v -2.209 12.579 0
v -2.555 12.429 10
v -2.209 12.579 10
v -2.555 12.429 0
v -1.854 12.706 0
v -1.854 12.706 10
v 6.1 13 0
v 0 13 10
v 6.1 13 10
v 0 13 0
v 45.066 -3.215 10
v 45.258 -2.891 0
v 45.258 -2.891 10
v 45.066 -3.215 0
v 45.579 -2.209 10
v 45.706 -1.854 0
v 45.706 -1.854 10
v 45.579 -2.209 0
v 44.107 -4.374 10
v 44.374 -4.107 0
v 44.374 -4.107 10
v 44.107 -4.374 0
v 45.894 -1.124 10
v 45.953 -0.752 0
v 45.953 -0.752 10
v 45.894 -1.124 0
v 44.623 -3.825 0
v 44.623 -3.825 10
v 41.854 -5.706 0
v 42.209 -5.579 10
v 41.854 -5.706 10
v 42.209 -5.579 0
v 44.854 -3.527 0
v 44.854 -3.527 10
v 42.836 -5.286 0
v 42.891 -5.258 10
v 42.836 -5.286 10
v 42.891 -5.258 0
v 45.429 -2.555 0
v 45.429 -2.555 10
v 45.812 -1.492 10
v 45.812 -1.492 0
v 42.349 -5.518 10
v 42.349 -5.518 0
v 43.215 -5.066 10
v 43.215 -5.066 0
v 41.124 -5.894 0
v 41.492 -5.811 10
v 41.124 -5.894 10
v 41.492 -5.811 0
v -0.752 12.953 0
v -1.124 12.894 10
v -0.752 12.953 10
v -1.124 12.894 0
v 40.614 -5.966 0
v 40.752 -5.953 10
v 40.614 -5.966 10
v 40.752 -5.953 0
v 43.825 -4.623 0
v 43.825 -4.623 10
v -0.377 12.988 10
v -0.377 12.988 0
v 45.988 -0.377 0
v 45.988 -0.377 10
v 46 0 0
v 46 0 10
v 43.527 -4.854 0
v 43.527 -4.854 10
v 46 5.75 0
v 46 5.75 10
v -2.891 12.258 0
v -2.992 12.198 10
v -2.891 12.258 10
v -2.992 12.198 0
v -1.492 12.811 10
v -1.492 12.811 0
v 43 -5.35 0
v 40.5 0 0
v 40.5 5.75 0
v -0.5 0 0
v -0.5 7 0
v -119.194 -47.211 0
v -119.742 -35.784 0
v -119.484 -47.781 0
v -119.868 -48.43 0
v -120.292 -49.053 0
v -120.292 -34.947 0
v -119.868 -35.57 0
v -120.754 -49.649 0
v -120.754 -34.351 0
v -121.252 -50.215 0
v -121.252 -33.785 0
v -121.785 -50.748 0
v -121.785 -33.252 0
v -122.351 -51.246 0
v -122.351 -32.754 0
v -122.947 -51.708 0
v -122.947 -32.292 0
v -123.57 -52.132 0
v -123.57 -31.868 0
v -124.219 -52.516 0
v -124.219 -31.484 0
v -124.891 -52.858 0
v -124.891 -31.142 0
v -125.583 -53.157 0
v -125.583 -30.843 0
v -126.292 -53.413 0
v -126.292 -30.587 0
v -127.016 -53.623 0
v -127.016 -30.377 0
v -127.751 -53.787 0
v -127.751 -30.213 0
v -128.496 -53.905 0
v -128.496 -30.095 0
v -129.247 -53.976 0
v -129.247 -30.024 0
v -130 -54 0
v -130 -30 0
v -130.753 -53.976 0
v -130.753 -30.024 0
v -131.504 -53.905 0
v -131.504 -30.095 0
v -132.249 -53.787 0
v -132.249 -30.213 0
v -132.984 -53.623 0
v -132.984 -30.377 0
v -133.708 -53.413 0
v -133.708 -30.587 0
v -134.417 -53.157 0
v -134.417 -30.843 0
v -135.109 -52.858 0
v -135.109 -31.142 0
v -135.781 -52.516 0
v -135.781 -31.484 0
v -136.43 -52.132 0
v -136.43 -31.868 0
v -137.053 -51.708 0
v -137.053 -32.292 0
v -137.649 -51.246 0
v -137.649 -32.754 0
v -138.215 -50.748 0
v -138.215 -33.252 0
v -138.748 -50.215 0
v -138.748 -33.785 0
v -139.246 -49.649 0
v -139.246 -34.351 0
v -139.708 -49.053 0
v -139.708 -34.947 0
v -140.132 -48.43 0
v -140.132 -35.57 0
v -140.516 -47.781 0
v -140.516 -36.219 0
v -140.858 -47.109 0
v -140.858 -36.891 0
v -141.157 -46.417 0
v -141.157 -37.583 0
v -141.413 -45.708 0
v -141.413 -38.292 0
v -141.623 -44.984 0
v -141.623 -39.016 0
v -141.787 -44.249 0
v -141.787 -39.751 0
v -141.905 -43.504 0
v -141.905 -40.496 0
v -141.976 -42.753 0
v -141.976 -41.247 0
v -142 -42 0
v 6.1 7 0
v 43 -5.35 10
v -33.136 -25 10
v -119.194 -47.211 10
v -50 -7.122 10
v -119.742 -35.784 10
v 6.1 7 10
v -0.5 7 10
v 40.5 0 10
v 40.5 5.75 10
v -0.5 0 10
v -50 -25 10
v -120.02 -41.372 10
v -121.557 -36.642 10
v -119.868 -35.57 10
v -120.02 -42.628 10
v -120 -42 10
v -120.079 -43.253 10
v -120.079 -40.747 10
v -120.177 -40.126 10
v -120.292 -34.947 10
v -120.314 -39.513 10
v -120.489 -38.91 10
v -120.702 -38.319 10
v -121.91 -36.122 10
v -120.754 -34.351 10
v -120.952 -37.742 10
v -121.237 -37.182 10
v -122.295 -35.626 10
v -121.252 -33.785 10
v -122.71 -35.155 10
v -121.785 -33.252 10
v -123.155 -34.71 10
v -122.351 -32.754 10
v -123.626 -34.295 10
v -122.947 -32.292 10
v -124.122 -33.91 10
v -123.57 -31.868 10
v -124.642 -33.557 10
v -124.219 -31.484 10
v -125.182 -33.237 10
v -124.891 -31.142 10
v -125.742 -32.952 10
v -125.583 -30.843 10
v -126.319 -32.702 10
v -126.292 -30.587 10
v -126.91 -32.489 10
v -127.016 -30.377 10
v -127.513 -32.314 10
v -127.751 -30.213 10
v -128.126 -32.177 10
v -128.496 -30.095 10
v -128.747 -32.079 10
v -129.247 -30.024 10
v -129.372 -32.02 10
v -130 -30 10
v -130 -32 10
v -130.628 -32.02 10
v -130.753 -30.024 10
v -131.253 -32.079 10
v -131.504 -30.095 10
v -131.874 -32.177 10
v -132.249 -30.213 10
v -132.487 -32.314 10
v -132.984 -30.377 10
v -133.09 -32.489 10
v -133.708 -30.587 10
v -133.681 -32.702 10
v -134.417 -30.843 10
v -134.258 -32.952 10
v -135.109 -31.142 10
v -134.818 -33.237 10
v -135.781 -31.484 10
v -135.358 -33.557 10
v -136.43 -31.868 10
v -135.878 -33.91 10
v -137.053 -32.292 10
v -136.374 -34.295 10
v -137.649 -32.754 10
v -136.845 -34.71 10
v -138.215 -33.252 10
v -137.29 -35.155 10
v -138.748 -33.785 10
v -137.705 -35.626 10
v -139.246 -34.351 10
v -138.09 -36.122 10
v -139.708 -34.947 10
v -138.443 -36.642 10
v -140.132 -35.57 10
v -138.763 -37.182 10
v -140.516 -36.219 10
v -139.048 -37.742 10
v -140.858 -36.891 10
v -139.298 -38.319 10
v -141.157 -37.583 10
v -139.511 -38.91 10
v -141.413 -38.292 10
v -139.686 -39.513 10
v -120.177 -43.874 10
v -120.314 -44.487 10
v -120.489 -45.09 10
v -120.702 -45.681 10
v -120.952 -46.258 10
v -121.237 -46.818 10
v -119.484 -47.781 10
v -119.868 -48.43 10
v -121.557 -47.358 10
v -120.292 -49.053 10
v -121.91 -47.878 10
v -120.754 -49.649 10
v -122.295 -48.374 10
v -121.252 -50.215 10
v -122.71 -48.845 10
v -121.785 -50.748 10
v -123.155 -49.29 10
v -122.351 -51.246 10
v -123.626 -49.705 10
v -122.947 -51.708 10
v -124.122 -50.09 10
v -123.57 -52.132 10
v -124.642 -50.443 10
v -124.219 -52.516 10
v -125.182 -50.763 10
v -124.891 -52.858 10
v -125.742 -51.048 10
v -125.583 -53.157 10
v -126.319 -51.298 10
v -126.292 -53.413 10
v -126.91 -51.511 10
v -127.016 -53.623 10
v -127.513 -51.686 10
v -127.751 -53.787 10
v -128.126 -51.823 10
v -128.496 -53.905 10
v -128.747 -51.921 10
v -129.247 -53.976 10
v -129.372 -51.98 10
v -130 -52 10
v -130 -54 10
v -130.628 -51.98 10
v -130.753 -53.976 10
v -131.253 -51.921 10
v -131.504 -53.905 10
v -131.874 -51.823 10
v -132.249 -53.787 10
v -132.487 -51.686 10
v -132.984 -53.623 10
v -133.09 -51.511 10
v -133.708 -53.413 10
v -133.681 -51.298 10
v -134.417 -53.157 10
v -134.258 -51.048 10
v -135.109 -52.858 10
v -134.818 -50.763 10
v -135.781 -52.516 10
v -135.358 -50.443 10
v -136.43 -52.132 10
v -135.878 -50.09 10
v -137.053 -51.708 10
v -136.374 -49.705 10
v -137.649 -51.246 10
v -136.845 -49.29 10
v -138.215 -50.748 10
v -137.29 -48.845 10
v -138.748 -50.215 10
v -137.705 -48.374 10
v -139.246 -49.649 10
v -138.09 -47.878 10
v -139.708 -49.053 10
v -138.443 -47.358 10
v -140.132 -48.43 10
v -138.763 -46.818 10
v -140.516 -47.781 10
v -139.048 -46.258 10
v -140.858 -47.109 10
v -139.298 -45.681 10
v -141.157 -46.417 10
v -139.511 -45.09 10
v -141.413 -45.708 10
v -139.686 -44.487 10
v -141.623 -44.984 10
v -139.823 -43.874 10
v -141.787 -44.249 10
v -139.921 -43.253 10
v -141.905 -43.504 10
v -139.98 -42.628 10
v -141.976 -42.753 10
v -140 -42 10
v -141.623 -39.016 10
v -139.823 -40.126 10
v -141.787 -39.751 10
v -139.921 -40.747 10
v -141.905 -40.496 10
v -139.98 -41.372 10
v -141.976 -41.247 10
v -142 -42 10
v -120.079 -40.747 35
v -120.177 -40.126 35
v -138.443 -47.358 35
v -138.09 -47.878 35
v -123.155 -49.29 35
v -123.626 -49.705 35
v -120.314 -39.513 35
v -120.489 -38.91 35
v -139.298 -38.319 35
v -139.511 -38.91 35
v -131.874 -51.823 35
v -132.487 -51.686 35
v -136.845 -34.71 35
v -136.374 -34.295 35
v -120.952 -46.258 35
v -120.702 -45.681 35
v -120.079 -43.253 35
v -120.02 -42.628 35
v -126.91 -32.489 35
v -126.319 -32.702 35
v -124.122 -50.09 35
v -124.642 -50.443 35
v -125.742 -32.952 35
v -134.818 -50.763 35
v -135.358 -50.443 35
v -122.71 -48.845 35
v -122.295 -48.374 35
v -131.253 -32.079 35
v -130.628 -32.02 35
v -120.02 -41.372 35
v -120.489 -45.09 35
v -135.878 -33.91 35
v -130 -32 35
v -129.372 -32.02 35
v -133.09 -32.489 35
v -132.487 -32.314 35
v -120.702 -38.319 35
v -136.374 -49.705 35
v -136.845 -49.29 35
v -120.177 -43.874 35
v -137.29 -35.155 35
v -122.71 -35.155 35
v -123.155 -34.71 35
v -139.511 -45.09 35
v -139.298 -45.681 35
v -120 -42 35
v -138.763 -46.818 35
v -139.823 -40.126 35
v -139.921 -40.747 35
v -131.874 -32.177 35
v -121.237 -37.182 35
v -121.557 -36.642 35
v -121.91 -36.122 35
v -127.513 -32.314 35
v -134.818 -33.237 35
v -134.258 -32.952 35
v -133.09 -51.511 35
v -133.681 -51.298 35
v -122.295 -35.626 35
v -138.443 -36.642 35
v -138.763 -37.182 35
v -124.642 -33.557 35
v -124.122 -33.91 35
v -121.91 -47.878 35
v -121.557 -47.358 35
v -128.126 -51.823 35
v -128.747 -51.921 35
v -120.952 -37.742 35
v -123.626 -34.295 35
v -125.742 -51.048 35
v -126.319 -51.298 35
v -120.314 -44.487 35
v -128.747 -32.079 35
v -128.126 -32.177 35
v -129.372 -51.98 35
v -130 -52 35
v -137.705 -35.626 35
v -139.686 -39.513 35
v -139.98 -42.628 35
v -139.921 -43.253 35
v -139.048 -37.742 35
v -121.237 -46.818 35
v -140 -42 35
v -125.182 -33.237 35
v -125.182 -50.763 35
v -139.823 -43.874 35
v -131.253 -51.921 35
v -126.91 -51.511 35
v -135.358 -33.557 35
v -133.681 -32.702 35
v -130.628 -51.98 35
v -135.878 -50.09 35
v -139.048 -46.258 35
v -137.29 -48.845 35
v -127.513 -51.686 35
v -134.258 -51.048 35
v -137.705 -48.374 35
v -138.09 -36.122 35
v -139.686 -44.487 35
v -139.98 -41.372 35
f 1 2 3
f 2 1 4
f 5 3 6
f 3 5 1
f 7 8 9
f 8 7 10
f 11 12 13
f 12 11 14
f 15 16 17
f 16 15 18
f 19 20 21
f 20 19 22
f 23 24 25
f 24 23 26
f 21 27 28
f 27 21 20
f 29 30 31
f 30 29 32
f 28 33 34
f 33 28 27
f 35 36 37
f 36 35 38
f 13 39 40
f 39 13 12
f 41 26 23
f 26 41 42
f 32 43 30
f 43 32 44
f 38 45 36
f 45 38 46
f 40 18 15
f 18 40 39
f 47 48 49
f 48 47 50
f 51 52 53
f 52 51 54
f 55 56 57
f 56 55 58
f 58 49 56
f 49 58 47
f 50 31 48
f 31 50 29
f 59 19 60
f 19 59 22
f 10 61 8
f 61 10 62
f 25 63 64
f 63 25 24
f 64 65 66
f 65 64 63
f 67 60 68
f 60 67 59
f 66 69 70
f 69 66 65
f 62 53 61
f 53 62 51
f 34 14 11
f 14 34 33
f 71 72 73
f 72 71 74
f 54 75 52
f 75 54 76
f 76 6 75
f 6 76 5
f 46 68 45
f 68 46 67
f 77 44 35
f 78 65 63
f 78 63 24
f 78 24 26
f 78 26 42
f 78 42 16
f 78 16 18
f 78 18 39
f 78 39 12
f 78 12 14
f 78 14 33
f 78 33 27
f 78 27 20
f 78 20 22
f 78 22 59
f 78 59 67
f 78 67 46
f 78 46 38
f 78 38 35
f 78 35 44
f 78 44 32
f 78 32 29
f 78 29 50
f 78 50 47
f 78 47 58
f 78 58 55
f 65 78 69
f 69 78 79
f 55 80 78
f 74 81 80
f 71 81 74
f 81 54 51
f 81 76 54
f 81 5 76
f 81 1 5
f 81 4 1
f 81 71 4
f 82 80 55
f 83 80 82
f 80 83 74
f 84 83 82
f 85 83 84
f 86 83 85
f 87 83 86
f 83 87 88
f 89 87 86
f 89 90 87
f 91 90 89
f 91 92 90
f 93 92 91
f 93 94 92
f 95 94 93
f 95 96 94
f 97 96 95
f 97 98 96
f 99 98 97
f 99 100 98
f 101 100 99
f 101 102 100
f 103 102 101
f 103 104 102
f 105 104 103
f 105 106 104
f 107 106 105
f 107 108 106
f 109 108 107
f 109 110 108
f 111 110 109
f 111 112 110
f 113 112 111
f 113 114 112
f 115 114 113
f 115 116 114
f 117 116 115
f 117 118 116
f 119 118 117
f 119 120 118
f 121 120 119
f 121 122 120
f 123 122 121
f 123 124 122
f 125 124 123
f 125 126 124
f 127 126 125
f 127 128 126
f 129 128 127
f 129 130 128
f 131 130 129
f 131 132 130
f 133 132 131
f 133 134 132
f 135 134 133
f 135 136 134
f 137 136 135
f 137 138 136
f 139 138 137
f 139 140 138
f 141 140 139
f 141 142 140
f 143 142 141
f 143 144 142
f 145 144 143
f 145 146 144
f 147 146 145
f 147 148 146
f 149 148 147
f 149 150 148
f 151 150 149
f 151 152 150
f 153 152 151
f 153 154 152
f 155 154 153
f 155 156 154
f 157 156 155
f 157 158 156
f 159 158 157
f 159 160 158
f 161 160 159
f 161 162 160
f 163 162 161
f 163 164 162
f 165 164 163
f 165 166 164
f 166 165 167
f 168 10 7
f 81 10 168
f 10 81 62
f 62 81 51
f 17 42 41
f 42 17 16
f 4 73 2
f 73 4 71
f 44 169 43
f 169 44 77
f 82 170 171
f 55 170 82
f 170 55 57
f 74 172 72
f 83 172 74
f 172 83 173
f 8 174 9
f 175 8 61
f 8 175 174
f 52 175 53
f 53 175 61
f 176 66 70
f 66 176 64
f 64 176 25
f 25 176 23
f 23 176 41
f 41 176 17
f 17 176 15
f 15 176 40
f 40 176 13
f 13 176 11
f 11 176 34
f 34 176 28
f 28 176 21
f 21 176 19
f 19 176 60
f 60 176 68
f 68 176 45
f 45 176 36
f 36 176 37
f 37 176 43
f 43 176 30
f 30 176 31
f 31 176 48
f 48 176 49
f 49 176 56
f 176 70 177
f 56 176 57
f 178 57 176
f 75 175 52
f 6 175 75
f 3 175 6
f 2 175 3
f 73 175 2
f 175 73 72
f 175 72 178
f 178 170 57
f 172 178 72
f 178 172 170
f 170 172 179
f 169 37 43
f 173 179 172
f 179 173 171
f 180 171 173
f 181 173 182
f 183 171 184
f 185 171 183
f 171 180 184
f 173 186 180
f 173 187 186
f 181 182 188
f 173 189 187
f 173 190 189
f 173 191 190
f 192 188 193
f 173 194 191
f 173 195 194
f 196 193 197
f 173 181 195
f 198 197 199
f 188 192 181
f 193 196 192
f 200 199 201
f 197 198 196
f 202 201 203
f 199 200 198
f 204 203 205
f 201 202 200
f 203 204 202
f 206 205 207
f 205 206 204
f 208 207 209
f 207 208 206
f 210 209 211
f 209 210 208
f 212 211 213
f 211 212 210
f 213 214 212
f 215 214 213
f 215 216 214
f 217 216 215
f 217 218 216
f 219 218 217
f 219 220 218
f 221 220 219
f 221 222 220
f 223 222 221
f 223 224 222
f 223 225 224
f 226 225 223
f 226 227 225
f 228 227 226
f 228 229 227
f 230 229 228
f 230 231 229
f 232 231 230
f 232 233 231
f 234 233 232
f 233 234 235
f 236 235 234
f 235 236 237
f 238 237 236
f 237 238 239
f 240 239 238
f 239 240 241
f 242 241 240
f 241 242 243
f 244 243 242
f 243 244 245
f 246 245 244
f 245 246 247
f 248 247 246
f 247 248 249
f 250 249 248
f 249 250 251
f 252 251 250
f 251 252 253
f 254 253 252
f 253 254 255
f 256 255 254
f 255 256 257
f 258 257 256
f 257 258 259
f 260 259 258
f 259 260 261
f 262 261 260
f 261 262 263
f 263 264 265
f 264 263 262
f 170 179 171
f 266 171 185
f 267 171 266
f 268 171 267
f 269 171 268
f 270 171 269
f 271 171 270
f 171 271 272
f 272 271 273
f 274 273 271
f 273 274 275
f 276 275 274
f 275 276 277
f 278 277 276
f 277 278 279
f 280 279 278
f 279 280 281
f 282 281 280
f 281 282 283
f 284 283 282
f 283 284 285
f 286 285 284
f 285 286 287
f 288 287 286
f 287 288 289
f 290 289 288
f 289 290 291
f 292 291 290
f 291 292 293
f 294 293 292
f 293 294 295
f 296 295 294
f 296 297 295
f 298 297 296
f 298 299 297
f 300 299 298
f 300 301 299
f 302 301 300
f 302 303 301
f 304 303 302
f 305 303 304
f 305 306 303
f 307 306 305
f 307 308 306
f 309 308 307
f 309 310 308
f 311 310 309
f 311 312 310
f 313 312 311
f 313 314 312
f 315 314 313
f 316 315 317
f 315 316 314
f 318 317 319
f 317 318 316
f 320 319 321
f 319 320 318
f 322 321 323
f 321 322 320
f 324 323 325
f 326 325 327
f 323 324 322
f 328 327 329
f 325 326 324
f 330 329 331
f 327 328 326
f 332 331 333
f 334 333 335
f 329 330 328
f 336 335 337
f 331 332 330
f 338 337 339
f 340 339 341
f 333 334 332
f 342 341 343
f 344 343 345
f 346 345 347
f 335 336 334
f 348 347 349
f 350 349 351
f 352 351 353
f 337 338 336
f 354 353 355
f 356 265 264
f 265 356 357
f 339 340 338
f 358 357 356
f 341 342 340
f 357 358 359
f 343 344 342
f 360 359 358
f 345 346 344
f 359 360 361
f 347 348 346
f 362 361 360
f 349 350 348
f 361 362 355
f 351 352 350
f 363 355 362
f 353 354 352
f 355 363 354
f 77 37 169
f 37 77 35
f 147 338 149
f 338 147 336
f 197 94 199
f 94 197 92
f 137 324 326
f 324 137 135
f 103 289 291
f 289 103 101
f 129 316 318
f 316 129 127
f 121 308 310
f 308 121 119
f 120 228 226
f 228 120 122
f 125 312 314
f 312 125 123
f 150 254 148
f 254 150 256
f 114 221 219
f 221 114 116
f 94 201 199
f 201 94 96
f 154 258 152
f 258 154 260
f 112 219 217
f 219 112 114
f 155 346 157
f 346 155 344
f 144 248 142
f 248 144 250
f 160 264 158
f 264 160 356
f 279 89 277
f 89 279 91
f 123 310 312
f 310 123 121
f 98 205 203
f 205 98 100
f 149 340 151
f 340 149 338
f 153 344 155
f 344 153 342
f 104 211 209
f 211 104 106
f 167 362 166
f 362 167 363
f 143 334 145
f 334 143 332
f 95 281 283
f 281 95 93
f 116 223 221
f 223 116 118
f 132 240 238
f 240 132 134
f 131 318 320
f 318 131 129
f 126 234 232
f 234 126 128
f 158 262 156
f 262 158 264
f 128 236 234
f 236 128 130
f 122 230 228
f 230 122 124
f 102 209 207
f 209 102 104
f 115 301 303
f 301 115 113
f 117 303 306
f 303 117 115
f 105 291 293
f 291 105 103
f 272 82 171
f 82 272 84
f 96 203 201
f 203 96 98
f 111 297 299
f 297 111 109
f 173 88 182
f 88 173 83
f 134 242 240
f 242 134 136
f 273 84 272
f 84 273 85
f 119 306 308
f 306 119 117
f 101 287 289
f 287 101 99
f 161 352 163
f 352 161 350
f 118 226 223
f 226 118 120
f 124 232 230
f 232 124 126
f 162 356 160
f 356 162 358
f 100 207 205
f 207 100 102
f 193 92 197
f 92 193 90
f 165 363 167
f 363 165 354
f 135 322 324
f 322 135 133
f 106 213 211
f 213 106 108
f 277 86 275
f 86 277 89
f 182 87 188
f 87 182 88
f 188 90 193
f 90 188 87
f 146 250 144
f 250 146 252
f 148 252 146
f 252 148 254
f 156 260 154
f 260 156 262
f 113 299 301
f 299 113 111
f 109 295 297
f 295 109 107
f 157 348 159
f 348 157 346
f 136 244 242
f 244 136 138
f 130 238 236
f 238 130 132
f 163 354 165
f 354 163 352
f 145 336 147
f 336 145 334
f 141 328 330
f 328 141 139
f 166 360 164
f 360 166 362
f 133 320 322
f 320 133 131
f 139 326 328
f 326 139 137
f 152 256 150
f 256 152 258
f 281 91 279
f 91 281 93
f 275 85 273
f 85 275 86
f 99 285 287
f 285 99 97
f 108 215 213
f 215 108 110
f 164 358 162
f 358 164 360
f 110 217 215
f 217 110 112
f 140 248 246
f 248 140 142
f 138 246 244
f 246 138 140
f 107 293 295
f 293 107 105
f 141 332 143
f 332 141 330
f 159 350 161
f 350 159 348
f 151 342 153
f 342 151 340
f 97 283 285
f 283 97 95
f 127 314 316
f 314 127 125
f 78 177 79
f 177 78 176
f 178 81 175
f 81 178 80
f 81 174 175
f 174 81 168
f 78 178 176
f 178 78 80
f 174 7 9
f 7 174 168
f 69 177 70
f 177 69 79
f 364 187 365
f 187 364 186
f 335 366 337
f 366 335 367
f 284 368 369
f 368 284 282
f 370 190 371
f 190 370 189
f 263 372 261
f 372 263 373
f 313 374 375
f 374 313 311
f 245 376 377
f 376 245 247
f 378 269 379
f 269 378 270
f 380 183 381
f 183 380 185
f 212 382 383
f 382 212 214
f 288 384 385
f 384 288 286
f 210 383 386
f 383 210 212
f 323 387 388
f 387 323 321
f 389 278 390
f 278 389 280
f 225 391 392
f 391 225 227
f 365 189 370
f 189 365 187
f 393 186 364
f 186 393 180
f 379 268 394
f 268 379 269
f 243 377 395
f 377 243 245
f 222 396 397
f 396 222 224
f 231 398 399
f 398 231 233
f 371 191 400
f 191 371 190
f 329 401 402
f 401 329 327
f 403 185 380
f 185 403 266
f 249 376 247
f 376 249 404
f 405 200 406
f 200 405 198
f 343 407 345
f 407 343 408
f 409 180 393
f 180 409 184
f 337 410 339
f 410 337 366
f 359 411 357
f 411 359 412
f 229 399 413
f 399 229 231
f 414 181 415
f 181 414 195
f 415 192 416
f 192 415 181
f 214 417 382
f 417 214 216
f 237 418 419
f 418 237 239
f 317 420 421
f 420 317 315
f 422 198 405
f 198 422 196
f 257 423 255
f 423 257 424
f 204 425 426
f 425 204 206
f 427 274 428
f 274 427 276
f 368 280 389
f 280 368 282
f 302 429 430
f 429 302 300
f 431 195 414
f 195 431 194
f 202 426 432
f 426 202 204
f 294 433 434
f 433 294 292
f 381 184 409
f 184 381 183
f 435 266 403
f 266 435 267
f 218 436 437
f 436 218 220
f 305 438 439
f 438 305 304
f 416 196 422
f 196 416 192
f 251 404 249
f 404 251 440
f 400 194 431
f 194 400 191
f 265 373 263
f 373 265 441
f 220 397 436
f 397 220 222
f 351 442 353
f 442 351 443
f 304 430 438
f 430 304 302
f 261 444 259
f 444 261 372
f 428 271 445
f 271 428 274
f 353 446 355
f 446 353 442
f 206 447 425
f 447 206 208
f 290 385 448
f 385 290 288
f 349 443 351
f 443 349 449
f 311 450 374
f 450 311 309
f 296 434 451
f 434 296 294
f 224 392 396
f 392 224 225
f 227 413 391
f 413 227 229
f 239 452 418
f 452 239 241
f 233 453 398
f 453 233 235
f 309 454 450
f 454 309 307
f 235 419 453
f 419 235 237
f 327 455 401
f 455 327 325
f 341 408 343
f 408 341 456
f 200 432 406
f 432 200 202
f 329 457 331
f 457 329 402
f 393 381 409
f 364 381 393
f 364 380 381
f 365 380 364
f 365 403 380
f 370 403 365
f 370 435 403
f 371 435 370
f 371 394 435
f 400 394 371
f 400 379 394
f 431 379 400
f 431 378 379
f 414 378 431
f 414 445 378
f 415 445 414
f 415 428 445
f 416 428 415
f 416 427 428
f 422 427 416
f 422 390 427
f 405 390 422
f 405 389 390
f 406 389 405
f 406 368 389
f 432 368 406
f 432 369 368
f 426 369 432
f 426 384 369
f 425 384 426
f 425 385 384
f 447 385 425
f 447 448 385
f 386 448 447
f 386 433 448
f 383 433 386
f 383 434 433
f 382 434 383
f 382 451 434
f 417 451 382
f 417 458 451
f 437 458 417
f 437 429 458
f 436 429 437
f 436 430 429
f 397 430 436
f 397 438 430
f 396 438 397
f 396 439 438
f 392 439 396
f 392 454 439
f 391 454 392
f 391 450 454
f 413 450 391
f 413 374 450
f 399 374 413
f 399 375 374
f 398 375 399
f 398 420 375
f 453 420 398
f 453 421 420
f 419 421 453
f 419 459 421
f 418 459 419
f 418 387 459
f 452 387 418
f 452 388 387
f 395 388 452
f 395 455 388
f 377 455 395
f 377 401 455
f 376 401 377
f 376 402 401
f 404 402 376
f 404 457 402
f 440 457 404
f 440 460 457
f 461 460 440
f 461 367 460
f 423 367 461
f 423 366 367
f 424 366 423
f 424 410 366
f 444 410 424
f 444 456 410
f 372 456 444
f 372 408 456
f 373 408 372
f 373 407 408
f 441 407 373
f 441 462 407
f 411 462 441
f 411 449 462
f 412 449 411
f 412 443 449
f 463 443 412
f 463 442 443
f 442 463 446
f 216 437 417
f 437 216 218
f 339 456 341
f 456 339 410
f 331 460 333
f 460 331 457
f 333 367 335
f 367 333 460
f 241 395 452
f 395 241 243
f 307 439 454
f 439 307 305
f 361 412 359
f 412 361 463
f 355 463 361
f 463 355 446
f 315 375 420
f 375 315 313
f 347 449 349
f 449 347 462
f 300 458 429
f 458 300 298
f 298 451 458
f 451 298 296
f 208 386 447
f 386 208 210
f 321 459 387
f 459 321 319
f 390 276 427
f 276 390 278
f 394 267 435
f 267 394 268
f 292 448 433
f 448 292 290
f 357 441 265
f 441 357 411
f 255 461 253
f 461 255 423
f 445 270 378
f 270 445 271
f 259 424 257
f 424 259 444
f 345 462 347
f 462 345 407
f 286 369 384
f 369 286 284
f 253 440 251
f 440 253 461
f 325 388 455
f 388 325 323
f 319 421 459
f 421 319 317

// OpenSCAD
//--------------------------------------------------------------------------
//-- Soporte para rollo de filamento de prusa i3. (c) Antonio Castro Gómez
//--------------------------------------------------------------------------
//-- Released under the GPL license
//--------------------------------------------------------------------------


difference()
{
	union()
	{

		//enganche con marco
		difference()
		{
			union()
			{
				minkowski()
				{
					cylinder(h=8, r=6, $fn=100, center=true);
					translate([20,3.5,8])cube(size=[40,7,8], center=true);
				}

				//Cuerpo spooler
				linear_extrude(height = 10)
				polygon(points=[	[-2.5,12.4], /*pico enganche superior*/
								[43,-5.35], /*pico encganche inferior*/
								[-130,-50],
								[-130,-40] ]);

				//base soporte
				translate([-130,-42,5])cylinder(h=10, r=12, $fn=100, center=true);
			}
				translate([20,3.5,10])cube(size=[41,7,25], center=true);
				translate([26.1,9.5,10])cube(size=[40,7.5,25], center=true);
				translate([0,0,18])cube(size=[100,50,16], center=true);
				translate([-130,-42,-1])cylinder(h=30, r=1.8, $fn=100, center=true);
		}
		translate([-130,-42,17.5])cylinder(h=35, r=10, $fn=100, center=true);
	}//Fin union()
}
